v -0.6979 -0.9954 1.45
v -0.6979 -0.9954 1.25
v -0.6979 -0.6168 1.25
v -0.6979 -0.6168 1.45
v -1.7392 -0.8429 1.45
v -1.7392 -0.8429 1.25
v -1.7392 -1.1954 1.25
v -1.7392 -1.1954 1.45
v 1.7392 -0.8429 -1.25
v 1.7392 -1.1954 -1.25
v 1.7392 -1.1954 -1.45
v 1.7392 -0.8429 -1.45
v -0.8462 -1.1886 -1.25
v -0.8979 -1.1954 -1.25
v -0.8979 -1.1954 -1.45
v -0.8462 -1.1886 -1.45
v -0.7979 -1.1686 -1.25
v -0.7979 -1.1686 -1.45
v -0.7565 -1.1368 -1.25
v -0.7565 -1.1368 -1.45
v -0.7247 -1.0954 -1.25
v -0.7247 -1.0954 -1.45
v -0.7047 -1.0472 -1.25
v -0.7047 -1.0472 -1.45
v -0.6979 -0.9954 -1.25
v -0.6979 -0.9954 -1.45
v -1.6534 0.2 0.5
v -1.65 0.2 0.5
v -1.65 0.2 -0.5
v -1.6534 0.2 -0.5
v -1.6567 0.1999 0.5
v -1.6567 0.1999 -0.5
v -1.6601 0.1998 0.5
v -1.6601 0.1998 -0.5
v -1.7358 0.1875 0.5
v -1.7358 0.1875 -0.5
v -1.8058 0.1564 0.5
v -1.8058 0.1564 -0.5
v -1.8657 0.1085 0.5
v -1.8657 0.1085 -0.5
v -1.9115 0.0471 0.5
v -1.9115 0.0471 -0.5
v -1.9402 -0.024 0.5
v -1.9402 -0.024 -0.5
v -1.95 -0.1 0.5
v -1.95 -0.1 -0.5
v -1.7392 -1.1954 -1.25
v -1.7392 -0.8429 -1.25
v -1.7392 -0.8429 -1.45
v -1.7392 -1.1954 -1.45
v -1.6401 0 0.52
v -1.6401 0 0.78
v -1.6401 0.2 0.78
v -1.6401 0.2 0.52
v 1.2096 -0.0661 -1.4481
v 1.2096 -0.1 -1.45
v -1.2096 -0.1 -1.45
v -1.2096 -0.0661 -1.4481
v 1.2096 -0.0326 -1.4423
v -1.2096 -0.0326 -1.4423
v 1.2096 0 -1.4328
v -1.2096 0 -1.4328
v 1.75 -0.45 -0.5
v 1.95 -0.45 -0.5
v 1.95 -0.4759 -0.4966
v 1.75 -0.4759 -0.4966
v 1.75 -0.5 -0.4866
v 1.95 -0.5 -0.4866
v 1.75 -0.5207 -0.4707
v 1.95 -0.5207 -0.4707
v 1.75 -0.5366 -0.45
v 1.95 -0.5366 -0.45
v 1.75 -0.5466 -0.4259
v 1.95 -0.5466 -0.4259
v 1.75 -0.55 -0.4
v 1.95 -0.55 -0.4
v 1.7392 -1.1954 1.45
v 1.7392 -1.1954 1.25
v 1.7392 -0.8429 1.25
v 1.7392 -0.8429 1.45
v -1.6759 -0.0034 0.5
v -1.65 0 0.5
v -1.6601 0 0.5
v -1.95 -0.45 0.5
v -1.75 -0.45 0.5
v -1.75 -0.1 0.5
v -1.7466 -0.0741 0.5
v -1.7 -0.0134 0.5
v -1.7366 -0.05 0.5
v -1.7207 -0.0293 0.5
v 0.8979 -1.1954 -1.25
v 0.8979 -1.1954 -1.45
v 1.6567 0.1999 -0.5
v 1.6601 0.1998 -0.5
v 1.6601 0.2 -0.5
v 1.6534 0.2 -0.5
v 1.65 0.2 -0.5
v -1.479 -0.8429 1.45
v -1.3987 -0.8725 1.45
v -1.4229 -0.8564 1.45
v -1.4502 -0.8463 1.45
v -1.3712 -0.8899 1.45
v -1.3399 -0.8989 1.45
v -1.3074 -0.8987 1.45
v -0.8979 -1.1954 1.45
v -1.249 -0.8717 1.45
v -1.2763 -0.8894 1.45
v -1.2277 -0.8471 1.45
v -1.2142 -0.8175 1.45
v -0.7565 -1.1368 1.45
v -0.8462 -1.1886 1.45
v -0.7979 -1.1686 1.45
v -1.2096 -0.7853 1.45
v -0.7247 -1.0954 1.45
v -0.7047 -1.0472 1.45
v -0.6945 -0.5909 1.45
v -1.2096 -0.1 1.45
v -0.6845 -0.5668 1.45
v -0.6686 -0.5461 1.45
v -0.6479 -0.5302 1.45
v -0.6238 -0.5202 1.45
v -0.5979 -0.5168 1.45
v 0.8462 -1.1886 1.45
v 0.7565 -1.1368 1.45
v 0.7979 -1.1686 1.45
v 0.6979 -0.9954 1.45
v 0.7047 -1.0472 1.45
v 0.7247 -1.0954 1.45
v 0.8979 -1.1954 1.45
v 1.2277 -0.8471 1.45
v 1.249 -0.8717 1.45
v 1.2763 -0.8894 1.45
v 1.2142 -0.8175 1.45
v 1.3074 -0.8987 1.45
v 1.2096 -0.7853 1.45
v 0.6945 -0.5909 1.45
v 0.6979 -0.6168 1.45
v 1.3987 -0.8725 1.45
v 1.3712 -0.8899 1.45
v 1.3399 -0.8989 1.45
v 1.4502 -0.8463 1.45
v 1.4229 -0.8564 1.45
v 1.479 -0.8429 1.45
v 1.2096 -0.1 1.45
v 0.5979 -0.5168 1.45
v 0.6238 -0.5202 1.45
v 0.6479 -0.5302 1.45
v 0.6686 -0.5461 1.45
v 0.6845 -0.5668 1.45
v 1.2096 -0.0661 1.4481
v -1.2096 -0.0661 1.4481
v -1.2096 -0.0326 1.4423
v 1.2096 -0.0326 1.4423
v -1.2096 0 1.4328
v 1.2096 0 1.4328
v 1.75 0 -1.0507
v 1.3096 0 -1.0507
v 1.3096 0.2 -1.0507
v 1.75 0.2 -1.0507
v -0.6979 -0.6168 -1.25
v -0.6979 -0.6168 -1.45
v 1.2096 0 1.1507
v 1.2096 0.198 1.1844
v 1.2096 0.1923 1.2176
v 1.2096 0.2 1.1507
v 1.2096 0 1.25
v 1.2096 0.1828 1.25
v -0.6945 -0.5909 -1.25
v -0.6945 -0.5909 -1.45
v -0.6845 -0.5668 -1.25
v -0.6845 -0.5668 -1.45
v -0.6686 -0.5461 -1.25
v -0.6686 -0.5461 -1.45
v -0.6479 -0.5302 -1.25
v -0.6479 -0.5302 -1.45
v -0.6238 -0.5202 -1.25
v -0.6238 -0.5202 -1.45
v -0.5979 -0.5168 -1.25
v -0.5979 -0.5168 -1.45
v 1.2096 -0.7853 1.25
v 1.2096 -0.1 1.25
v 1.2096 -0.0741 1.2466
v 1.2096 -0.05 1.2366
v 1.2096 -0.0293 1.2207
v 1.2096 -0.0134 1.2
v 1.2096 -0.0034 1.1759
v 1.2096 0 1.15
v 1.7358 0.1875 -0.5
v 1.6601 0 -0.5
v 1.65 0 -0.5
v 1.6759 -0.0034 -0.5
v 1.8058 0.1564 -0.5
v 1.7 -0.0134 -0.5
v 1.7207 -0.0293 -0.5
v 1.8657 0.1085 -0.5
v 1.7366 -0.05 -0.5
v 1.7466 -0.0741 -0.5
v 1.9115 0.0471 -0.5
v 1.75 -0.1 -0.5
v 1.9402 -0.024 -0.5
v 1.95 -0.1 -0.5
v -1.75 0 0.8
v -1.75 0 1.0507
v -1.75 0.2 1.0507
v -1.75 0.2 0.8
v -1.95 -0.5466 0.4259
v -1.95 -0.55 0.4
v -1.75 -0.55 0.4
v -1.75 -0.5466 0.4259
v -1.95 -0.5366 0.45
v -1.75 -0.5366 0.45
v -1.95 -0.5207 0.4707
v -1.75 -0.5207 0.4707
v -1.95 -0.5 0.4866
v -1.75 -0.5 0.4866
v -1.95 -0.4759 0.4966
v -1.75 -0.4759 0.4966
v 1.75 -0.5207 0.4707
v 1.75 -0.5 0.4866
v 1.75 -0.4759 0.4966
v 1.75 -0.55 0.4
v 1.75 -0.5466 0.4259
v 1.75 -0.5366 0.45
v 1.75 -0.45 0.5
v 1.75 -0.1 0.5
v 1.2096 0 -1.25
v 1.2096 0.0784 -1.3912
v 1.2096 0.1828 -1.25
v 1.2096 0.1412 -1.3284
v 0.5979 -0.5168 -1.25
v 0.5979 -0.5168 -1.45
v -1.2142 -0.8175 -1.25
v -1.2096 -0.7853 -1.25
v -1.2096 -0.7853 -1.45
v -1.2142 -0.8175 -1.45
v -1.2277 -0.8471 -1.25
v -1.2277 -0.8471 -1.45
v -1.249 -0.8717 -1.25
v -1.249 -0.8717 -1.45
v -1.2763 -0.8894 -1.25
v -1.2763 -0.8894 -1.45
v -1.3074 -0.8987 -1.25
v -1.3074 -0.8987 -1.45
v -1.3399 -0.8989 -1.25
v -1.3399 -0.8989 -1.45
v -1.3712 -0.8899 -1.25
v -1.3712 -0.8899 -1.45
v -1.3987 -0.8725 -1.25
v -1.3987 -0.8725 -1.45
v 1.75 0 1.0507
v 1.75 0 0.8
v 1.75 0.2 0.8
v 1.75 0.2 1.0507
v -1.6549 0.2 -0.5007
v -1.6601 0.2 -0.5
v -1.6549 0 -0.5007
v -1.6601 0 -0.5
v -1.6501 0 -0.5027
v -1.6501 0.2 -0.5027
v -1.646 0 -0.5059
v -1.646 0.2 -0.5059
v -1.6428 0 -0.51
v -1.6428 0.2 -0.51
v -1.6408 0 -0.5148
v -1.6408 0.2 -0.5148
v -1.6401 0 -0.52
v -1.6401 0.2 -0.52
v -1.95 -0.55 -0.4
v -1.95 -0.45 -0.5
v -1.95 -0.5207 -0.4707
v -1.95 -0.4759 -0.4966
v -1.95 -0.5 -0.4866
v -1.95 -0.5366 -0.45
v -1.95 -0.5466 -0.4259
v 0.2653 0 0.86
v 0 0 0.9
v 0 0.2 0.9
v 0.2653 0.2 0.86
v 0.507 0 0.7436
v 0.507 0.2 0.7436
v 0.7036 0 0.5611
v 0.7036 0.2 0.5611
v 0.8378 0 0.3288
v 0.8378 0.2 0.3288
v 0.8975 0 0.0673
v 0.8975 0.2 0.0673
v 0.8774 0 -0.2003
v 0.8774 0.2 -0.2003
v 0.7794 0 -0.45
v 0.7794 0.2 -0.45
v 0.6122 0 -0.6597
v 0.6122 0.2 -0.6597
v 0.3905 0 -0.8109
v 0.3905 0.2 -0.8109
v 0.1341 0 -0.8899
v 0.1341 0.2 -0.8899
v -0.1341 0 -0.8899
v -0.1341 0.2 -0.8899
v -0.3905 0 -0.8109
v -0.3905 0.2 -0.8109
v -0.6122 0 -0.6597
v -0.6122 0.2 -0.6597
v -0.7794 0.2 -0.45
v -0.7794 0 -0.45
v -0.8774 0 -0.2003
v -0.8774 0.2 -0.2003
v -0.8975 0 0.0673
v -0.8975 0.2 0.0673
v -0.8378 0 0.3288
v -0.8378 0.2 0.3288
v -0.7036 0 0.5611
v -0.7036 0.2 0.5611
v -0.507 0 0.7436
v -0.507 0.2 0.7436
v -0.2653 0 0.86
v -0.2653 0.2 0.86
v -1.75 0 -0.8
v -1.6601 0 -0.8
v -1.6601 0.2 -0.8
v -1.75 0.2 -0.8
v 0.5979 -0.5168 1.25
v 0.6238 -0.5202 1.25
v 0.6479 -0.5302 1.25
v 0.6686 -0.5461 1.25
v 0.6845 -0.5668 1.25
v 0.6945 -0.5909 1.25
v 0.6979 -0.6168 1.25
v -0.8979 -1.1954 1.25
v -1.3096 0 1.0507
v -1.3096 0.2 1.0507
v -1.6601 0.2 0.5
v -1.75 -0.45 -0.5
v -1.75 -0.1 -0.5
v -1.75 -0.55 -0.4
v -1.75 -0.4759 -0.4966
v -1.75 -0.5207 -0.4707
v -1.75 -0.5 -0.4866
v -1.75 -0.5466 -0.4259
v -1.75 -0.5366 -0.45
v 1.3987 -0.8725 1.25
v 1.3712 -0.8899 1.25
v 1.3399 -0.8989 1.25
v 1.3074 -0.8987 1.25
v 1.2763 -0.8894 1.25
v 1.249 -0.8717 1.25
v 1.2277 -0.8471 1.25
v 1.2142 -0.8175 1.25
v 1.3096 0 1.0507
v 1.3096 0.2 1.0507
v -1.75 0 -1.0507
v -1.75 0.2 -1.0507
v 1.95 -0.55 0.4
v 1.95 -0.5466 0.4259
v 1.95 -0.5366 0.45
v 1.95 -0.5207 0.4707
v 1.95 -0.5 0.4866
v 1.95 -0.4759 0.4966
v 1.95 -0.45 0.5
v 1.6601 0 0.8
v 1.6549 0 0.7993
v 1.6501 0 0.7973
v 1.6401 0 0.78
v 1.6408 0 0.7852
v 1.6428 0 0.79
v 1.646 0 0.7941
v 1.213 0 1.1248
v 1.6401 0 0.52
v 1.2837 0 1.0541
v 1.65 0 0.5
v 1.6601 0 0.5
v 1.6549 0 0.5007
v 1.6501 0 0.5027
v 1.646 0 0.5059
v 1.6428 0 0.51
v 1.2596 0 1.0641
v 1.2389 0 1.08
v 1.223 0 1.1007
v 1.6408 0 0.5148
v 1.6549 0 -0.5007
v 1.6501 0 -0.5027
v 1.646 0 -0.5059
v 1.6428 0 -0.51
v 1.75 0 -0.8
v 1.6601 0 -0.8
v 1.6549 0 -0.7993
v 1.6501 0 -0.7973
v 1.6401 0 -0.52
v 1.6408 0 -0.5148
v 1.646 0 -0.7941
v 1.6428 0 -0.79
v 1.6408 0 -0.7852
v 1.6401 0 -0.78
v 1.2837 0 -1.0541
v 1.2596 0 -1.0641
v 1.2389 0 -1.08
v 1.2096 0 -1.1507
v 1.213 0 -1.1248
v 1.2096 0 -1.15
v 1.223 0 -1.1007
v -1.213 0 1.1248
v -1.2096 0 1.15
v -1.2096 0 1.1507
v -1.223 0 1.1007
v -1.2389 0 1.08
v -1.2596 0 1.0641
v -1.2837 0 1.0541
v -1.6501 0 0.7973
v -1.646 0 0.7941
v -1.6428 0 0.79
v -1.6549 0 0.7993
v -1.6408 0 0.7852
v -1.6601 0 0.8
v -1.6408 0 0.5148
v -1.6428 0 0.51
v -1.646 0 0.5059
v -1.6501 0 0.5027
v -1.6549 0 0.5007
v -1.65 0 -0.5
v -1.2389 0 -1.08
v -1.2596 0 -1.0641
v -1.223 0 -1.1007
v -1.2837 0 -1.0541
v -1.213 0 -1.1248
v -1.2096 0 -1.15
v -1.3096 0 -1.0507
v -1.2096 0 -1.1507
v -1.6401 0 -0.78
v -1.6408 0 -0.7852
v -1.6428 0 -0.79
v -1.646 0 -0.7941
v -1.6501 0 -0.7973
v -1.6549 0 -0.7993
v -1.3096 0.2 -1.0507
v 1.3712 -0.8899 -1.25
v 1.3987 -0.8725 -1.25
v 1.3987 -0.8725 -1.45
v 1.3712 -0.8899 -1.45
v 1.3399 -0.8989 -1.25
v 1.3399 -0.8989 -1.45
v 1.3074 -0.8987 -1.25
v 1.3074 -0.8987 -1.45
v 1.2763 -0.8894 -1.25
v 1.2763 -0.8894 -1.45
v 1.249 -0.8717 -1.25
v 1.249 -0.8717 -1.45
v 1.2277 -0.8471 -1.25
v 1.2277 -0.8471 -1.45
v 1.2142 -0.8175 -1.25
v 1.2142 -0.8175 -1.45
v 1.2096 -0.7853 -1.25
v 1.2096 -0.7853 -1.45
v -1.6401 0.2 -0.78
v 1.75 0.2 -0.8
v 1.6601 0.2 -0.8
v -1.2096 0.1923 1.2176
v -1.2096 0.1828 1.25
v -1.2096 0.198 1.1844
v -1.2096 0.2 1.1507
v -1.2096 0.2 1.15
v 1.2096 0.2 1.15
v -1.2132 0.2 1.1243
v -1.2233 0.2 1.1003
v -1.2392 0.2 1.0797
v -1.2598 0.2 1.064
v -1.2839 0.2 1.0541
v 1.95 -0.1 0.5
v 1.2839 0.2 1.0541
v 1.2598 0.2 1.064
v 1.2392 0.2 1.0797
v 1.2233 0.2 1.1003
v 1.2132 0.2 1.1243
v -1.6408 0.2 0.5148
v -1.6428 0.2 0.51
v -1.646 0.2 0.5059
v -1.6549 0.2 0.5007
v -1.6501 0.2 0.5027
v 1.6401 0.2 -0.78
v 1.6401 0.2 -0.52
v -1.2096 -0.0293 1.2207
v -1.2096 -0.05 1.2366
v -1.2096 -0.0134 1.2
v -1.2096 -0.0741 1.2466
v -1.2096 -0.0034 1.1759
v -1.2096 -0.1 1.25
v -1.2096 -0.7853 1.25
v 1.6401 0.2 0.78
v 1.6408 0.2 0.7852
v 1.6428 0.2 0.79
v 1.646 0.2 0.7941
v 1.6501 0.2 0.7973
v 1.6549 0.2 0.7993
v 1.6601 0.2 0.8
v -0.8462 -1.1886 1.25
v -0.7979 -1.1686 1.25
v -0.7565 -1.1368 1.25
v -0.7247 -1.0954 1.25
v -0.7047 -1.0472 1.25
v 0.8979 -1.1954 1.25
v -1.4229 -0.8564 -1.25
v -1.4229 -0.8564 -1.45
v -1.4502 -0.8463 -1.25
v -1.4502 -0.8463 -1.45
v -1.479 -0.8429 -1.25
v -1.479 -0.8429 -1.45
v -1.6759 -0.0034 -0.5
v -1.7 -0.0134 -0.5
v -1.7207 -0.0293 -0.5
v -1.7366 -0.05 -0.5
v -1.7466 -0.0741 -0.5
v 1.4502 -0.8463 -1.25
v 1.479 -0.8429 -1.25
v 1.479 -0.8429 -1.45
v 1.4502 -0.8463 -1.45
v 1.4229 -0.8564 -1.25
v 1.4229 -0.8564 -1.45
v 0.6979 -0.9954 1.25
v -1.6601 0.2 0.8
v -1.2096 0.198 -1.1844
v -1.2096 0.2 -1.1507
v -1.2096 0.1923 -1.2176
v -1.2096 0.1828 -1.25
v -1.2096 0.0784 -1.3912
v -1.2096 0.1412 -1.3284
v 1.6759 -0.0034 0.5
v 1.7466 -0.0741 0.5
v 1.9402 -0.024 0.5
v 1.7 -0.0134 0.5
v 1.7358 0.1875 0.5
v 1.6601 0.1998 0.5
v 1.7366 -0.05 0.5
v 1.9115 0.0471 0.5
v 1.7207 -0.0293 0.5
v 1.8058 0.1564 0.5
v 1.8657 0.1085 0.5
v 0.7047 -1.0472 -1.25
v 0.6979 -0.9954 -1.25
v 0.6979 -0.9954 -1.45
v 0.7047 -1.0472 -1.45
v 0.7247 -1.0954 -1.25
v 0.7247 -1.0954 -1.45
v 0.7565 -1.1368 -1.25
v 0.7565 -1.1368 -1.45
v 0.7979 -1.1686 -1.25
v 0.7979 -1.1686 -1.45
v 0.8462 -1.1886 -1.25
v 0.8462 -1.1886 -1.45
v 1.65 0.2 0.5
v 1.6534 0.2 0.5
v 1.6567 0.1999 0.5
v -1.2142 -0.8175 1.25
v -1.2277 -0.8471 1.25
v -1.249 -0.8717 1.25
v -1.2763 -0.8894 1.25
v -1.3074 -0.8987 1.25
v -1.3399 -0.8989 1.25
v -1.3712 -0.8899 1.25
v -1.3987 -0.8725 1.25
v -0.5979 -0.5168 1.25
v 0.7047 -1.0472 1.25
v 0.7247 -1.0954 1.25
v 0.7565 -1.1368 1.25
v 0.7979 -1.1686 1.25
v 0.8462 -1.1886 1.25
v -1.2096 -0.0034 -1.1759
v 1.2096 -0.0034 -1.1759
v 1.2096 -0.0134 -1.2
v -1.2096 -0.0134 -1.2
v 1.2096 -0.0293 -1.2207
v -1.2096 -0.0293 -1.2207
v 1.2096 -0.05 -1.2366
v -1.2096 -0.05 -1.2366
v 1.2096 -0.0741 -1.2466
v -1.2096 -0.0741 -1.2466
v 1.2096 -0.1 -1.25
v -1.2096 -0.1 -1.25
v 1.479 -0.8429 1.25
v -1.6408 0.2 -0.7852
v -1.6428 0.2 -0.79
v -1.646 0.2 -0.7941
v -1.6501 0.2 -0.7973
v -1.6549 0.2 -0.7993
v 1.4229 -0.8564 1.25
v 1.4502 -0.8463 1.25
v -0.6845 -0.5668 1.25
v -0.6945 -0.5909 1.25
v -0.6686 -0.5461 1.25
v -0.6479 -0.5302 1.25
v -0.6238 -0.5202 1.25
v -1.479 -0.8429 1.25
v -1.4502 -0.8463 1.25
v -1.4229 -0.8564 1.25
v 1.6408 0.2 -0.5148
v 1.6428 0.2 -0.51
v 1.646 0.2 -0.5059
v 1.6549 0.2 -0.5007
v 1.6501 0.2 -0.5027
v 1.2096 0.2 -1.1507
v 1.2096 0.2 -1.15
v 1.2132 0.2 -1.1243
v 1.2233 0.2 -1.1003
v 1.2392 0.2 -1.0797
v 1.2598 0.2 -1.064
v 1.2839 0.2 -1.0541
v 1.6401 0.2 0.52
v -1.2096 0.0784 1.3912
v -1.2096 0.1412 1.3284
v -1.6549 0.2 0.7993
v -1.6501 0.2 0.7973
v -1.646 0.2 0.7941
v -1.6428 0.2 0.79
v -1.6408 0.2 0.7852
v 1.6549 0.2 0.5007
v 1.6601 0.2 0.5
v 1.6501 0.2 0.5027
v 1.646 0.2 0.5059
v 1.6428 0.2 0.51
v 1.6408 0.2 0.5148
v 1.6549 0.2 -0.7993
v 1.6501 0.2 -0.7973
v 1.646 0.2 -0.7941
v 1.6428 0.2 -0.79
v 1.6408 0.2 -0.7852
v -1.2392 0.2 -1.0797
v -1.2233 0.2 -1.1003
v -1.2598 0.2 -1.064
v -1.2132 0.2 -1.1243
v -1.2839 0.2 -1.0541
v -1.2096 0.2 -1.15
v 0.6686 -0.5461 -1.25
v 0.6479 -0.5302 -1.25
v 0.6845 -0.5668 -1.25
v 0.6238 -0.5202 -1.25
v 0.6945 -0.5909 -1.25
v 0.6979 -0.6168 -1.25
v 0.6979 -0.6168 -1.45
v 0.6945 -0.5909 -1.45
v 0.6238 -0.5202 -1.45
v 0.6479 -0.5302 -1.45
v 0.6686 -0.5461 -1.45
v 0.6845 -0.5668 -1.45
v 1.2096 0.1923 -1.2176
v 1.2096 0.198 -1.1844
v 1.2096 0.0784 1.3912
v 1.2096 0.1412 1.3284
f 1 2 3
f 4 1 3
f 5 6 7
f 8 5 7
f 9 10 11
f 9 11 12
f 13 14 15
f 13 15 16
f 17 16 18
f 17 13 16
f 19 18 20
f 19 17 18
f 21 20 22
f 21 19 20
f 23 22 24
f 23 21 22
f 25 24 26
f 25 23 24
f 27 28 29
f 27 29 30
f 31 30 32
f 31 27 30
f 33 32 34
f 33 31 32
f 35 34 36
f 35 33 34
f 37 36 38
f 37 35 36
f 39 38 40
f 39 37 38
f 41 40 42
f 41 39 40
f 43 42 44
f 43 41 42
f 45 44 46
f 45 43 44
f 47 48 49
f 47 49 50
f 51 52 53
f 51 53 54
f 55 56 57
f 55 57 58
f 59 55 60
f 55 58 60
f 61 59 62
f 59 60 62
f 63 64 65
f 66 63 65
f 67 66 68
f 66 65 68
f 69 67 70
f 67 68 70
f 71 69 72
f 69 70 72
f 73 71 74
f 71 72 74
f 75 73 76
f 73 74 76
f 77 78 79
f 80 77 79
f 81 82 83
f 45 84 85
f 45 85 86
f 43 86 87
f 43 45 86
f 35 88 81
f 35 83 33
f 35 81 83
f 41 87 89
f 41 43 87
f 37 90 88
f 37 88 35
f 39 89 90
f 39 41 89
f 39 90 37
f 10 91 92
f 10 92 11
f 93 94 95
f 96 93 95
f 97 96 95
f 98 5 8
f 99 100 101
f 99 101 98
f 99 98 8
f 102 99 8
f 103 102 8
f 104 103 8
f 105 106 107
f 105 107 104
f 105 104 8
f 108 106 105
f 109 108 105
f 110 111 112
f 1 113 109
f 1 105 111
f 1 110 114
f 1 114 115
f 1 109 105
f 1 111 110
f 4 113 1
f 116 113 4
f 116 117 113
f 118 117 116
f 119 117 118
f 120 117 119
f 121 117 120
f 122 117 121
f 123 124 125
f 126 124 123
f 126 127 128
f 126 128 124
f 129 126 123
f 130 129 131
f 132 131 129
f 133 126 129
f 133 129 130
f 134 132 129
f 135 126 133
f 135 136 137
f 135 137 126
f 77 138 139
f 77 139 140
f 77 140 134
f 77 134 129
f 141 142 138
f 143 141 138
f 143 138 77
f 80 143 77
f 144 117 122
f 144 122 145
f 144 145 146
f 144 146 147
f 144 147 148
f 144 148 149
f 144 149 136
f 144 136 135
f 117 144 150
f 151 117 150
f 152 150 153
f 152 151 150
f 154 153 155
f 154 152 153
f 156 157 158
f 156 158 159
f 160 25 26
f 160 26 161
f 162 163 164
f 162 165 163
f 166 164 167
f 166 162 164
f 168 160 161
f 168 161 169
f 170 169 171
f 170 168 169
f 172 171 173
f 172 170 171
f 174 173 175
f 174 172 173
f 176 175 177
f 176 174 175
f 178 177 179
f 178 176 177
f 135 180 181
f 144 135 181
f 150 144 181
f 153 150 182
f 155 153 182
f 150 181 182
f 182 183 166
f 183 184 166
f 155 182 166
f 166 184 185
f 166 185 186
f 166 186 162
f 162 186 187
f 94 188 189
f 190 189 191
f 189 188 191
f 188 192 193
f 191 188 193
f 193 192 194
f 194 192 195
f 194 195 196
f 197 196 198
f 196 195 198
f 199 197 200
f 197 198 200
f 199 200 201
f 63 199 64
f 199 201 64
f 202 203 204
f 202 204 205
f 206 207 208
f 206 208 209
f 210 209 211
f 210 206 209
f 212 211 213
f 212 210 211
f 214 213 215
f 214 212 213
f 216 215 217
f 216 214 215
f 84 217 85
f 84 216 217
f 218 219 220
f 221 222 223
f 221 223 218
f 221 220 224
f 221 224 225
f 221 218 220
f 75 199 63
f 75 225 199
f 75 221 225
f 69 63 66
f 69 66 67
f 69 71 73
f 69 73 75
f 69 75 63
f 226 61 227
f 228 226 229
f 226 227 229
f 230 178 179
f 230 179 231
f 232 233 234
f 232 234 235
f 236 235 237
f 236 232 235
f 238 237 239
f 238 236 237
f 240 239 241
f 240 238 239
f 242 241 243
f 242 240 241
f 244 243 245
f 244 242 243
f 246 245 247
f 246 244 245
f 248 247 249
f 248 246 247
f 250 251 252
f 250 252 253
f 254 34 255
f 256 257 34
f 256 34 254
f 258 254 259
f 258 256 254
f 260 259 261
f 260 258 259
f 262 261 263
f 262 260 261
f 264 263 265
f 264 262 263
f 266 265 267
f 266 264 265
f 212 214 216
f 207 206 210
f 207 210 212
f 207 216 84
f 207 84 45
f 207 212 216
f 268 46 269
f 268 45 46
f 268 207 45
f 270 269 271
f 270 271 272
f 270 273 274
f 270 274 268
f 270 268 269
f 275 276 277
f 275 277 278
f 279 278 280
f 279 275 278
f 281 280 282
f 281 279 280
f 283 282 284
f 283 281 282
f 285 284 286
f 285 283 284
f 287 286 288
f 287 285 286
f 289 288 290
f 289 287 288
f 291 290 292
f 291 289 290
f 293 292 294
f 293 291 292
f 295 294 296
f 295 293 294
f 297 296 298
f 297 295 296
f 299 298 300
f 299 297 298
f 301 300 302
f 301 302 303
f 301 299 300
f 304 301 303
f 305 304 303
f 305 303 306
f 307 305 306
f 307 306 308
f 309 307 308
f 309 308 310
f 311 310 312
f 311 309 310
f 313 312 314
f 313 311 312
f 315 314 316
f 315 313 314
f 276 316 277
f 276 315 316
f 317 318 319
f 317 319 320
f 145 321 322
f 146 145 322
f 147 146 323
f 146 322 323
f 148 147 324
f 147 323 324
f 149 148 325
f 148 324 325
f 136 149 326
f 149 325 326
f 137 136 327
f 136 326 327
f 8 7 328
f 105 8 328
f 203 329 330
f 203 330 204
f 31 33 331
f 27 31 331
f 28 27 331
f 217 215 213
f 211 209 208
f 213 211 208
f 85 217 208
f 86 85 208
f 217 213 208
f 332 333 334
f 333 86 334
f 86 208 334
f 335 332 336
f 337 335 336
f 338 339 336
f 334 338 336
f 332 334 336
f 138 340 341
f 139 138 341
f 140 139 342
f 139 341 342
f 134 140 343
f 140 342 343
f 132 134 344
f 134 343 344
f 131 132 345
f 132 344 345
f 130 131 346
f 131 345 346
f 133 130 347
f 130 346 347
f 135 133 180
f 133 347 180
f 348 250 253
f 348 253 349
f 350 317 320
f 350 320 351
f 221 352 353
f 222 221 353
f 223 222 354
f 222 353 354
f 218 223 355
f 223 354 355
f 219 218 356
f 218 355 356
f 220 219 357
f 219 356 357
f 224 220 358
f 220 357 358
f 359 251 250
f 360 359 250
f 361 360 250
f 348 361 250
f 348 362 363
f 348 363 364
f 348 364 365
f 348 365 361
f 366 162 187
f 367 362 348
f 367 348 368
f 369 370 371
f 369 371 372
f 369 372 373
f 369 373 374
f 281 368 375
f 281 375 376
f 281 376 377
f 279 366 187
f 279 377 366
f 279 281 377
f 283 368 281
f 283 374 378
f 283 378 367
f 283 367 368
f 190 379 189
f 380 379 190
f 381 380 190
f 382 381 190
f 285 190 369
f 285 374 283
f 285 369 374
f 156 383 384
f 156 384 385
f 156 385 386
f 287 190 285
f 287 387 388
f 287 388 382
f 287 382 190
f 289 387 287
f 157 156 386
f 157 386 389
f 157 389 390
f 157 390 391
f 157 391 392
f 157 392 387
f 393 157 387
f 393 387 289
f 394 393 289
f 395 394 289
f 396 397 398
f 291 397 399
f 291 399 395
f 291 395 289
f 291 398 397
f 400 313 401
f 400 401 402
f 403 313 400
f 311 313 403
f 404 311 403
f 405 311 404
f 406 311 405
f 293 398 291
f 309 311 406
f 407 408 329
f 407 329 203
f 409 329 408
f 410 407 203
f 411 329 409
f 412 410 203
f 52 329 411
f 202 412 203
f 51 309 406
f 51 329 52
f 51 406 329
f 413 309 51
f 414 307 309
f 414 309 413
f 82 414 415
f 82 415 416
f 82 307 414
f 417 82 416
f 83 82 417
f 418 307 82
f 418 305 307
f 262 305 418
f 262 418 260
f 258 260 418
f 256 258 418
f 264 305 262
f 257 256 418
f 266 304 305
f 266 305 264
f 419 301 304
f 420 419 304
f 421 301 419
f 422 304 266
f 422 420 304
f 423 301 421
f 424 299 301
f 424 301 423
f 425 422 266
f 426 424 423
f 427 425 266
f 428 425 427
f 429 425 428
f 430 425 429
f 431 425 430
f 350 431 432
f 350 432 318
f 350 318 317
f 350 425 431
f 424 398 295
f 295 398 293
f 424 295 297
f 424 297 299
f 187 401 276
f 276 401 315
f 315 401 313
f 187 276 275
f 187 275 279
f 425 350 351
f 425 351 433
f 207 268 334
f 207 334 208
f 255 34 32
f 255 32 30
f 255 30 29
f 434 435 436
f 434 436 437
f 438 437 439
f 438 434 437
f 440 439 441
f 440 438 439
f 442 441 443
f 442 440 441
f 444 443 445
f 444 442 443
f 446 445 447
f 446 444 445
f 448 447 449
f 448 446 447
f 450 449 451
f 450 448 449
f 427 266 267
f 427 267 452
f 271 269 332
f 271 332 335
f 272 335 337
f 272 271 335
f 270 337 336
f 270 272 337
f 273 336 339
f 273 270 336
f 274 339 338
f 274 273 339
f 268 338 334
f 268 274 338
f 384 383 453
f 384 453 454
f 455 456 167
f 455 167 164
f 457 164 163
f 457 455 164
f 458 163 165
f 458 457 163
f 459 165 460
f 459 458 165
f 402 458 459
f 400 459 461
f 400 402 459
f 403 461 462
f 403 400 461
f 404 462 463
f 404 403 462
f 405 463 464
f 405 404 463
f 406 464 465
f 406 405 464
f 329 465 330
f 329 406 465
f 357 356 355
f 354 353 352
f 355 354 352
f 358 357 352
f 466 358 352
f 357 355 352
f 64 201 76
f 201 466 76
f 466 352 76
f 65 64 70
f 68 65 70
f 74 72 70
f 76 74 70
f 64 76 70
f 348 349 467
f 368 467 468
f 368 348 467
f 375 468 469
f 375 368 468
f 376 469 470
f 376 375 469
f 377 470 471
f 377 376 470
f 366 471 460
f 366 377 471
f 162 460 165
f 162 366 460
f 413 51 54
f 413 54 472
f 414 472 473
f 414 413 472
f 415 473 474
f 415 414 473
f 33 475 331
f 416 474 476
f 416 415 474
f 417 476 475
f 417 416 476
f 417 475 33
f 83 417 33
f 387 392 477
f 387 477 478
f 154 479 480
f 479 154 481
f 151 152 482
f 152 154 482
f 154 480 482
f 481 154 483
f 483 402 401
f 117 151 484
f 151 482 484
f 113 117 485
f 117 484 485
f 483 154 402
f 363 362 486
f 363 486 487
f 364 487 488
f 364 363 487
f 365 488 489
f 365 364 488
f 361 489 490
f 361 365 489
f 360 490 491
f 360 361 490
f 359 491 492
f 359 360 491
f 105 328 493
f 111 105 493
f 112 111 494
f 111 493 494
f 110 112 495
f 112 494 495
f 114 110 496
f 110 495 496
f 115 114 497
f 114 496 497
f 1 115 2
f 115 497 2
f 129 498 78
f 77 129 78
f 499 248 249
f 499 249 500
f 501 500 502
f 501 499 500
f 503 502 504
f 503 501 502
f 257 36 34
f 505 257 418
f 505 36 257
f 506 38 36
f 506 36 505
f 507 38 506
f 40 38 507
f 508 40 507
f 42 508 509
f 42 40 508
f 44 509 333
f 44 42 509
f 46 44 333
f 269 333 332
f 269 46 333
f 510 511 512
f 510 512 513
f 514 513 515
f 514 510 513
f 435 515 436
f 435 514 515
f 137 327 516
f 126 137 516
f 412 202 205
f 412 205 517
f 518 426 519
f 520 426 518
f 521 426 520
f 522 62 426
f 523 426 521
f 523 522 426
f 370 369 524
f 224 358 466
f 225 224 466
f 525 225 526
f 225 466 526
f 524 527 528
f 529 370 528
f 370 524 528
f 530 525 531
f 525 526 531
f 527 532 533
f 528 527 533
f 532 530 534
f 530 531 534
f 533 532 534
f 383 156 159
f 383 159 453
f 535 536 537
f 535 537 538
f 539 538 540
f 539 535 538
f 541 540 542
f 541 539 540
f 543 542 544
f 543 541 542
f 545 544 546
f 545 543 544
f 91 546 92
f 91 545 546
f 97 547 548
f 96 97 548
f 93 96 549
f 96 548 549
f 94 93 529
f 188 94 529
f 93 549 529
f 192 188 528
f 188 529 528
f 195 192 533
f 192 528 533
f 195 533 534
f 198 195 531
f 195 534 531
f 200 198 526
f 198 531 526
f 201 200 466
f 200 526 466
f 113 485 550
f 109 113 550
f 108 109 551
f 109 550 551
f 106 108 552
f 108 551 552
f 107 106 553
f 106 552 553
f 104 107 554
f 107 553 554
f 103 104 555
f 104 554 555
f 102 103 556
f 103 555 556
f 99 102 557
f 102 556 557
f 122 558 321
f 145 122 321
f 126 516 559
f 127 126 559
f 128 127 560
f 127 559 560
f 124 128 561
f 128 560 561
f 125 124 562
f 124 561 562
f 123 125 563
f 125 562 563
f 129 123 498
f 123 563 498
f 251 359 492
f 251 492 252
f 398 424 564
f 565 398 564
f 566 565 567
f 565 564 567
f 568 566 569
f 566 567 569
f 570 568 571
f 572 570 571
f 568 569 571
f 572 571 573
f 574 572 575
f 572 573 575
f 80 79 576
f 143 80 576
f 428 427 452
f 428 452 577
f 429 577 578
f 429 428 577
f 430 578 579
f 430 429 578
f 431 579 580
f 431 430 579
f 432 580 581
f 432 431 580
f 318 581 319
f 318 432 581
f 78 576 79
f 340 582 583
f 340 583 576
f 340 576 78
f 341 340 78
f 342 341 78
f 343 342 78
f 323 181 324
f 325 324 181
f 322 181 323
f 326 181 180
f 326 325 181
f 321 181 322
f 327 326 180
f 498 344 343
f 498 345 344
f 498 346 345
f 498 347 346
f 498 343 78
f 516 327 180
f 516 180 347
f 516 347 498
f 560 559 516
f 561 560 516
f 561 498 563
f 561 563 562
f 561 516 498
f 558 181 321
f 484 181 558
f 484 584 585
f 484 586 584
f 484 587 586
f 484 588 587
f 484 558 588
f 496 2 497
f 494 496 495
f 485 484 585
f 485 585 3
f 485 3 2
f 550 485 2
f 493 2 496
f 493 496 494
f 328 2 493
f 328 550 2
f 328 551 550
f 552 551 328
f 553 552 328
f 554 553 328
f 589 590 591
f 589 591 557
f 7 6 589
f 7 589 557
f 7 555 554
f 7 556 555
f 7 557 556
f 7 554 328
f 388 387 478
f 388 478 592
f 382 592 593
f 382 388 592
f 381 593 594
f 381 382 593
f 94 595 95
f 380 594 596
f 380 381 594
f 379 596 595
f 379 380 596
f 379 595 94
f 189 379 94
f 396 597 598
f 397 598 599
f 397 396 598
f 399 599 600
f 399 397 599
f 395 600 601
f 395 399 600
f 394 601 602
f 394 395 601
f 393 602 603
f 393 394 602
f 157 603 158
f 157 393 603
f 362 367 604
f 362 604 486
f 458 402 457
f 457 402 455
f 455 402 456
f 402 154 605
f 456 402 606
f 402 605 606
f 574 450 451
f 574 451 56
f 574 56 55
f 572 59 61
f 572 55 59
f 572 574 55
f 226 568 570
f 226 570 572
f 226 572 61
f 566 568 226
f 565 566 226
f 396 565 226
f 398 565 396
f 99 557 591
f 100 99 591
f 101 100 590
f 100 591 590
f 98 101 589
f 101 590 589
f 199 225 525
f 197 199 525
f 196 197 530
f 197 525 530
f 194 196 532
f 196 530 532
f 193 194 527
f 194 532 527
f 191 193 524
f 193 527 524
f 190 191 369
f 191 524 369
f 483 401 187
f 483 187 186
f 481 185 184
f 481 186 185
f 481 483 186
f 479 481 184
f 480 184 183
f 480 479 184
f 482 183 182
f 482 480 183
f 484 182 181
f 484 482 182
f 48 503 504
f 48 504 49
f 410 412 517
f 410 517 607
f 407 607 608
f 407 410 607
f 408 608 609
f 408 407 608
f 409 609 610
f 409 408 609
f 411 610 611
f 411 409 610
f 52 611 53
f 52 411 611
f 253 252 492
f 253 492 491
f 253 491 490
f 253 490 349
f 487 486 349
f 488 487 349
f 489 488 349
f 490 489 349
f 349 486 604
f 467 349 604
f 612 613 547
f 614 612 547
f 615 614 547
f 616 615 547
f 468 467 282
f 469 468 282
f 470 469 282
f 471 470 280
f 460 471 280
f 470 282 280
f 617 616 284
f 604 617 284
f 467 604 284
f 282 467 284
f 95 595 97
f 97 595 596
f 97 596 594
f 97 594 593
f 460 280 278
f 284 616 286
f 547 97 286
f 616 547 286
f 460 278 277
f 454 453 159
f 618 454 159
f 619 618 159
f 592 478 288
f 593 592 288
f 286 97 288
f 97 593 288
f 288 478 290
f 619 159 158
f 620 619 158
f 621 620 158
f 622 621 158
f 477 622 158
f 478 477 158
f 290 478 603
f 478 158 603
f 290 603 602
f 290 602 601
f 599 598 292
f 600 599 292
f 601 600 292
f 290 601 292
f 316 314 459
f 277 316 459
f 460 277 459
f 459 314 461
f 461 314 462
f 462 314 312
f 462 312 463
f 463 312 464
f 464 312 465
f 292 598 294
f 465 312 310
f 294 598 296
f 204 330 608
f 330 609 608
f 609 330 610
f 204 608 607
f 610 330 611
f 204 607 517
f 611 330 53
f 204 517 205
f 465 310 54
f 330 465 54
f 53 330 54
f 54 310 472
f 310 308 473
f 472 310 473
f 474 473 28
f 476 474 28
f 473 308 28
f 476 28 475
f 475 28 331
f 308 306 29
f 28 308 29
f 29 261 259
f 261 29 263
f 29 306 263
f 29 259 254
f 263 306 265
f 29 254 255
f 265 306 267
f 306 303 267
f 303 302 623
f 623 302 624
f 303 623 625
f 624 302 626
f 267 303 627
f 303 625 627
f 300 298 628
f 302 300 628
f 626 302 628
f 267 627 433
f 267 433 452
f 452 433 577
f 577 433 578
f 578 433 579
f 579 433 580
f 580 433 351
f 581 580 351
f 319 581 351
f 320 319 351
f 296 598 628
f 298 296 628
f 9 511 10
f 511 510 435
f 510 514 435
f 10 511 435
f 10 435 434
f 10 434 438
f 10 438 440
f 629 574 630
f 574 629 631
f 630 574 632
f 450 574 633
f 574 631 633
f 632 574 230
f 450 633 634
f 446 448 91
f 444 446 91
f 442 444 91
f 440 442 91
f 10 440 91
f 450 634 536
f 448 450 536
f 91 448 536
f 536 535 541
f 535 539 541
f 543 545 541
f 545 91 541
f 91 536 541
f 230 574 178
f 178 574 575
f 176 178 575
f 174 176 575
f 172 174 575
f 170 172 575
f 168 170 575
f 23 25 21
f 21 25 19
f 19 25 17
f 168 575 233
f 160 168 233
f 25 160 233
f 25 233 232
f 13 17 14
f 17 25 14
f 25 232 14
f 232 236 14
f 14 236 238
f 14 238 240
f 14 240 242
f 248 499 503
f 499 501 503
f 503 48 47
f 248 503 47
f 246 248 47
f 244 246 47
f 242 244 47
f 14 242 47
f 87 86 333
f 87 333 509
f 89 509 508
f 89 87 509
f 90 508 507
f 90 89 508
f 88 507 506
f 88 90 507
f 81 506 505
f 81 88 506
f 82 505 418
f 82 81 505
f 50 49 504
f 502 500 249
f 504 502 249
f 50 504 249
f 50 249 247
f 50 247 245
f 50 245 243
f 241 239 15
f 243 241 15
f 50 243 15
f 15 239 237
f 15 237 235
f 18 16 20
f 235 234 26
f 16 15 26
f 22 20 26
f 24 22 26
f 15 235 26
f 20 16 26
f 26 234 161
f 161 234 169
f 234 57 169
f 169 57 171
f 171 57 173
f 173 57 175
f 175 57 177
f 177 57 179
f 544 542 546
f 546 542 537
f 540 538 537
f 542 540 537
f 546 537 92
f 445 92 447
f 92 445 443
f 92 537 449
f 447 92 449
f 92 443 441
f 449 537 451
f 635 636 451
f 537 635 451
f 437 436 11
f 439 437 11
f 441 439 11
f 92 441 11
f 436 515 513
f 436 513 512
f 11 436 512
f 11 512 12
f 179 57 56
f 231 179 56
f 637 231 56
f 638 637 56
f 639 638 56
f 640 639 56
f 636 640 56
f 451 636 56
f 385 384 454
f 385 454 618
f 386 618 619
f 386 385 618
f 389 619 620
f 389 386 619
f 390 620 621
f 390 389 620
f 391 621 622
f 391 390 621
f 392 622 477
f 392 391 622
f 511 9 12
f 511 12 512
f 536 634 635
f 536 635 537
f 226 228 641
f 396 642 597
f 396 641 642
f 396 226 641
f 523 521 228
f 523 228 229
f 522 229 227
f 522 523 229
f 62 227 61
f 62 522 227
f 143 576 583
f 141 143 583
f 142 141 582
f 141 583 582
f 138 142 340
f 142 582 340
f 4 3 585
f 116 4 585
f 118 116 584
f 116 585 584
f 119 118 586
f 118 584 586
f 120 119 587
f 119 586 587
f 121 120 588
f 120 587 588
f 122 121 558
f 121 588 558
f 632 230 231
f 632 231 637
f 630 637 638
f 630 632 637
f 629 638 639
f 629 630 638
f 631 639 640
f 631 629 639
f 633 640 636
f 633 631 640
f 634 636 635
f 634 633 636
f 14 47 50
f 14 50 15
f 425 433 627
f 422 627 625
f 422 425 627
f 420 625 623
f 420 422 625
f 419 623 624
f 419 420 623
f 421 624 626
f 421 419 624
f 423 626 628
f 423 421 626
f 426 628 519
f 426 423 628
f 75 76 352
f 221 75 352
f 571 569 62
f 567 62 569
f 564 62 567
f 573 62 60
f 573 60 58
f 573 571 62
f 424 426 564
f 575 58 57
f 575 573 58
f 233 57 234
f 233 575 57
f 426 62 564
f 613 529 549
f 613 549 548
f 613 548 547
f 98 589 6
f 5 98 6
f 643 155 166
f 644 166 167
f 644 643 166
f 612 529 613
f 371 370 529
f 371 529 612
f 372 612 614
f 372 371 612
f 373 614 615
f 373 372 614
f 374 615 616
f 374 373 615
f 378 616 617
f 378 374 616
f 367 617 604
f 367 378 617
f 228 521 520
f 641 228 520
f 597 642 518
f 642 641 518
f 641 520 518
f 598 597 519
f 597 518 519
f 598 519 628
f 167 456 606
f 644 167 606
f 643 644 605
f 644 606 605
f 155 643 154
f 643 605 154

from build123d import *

# Parameters (mm, degrees)
SKETCH_3_R                       = 0.9
SM_BASE_FLANGE_1_DEPTH           = 0.2
SM_EDGE_FLANGE_3_DEPTH           = 0.169178
SM_START                         = 1.15
SM_EDGE_FLANGE_3_2_DEPTH         = 0.3
SM_START_2                       = -1.739216372
SM_EDGE_FLANGE_3_3_DEPTH         = 3.478432744
SM_START_3                       = -1.209627878
SM_EDGE_FLANGE_3_4_DEPTH         = 2.419255168
SM_EDGE_FLANGE_4_STRIP_W         = 1
SM_EDGE_FLANGE_4_STRIP_H         = 0.2
SM_EDGE_FLANGE_4_STRIP_CUT_DEPTH = 1
SM_EDGE_FLANGE_4_DEPTH           = 1
SM_START_4                       = 0.2
SM_EDGE_FLANGE_4_FLAT_DEPTH      = 0.2


with BuildPart() as part:
    # 基体-法兰1: sheet metal written as solids
    # 草图3 → 基体-法兰1 (new body)
    with BuildSketch(Plane(origin=(0, 0, 0), x_dir=(1, 0, 0), z_dir=(0, 1, 0))):
        with BuildLine():
            Line((1.75, 0.5), (1.75, -0.5))
            Line((1.75, -0.5), (1.690116035, -0.5))
            Line((1.690116035, -0.5), (1.660116035, -0.5))
            ThreePointArc((1.660116035, -0.5), (1.645973899, -0.505857864), (1.640116035, -0.52))
            Line((1.640116035, -0.52), (1.640116035, -0.55))
            Line((1.640116035, -0.55), (1.640116035, -0.75))
            Line((1.640116035, -0.75), (1.640116035, -0.78))
            ThreePointArc((1.640116035, -0.78), (1.645973899, -0.794142136), (1.660116035, -0.8))
            Line((1.660116035, -0.8), (1.690116035, -0.8))
            Line((1.690116035, -0.8), (1.75, -0.8))
            Line((1.75, -0.8), (1.75, -1.050703944))
            Line((1.75, -1.050703944), (1.309627878, -1.050703944))
            ThreePointArc((1.309627878, -1.050703944), (1.2389172, -1.079993266), (1.209627878, -1.150703944))
            Line((1.209627878, -1.150703944), (1.209627878, -1.244254067))
            Line((1.209627878, -1.244254067), (1.209627878, -1.25))
            Line((1.209627878, -1.25), (1.121614786, -1.25))
            Line((1.121614786, -1.25), (-1.121614786, -1.25))
            Line((-1.121614786, -1.25), (-1.209627878, -1.25))
            Line((-1.209627878, -1.25), (-1.209627878, -1.244254067))
            Line((-1.209627878, -1.244254067), (-1.209627878, -1.150703944))
            ThreePointArc((-1.209627878, -1.150703944), (-1.2389172, -1.079993266), (-1.309627878, -1.050703944))
            Line((-1.309627878, -1.050703944), (-1.75, -1.050703944))
            Line((-1.75, -1.050703944), (-1.75, -0.8))
            Line((-1.75, -0.8), (-1.690116035, -0.8))
            Line((-1.690116035, -0.8), (-1.660116035, -0.8))
            ThreePointArc((-1.660116035, -0.8), (-1.645973899, -0.794142136), (-1.640116035, -0.78))
            Line((-1.640116035, -0.78), (-1.640116035, -0.75))
            Line((-1.640116035, -0.75), (-1.640116035, -0.55))
            Line((-1.640116035, -0.55), (-1.640116035, -0.52))
            ThreePointArc((-1.640116035, -0.52), (-1.645973899, -0.505857864), (-1.660116035, -0.5))
            Line((-1.660116035, -0.5), (-1.690116035, -0.5))
            Line((-1.690116035, -0.5), (-1.75, -0.5))
            Line((-1.75, -0.5), (-1.75, 0.5))
            Line((-1.75, 0.5), (-1.690116035, 0.5))
            Line((-1.690116035, 0.5), (-1.660116035, 0.5))
            ThreePointArc((-1.660116035, 0.5), (-1.645973899, 0.505857864), (-1.640116035, 0.52))
            Line((-1.640116035, 0.52), (-1.640116035, 0.55))
            Line((-1.640116035, 0.55), (-1.640116035, 0.75))
            Line((-1.640116035, 0.75), (-1.640116035, 0.78))
            ThreePointArc((-1.640116035, 0.78), (-1.645973899, 0.794142136), (-1.660116035, 0.8))
            Line((-1.660116035, 0.8), (-1.690116035, 0.8))
            Line((-1.690116035, 0.8), (-1.75, 0.8))
            Line((-1.75, 0.8), (-1.75, 1.050703944))
            Line((-1.75, 1.050703944), (-1.309627878, 1.050703944))
            ThreePointArc((-1.309627878, 1.050703944), (-1.2389172, 1.079993266), (-1.209627878, 1.150703944))
            Line((-1.209627878, 1.150703944), (-1.209627878, 1.244254067))
            Line((-1.209627878, 1.244254067), (-1.209627878, 1.25))
            Line((-1.209627878, 1.25), (-1.121614786, 1.25))
            Line((-1.121614786, 1.25), (1.121614786, 1.25))
            Line((1.121614786, 1.25), (1.209627878, 1.25))
            Line((1.209627878, 1.25), (1.209627878, 1.244254067))
            Line((1.209627878, 1.244254067), (1.209627878, 1.150703944))
            ThreePointArc((1.209627878, 1.150703944), (1.2389172, 1.079993266), (1.309627878, 1.050703944))
            Line((1.309627878, 1.050703944), (1.75, 1.050703944))
            Line((1.75, 1.050703944), (1.75, 0.8))
            Line((1.75, 0.8), (1.690116035, 0.8))
            Line((1.690116035, 0.8), (1.660116035, 0.8))
            ThreePointArc((1.660116035, 0.8), (1.645973899, 0.794142136), (1.640116035, 0.78))
            Line((1.640116035, 0.78), (1.640116035, 0.75))
            Line((1.640116035, 0.75), (1.640116035, 0.55))
            Line((1.640116035, 0.55), (1.640116035, 0.52))
            ThreePointArc((1.640116035, 0.52), (1.645973899, 0.505857864), (1.660116035, 0.5))
            Line((1.660116035, 0.5), (1.690116035, 0.5))
            Line((1.690116035, 0.5), (1.75, 0.5))
        make_face()
        with Locations(Location((0, 0, 0), (0, 0, 270))):
            Circle(SKETCH_3_R, mode=Mode.SUBTRACT)
    extrude(amount=SM_BASE_FLANGE_1_DEPTH)

    # 边线-法兰3: read off the stored shape, not the designer's step
    # 边线-法兰3 outline → 边线-法兰3 (add)
    with BuildSketch(Plane(origin=(0, 0, 1.25), x_dir=(-1, 0, 0), z_dir=(0, 0, 1))):
        with BuildLine():
            Line((-1.20962729, 0.785296441), (-1.209627878, 0))
            Line((-1.209627878, 0), (1.209627878, 0))
            Line((1.209627878, 0), (1.20962729, 0.785296441))
            ThreePointArc((1.20962729, 0.785296441), (1.276253046, 0.889408078), (1.398699548, 0.872523806))
            ThreePointArc((1.398699548, 0.872523806), (1.436230193, 0.850547775), (1.479045273, 0.842908124))
            Line((1.479045273, 0.842908124), (1.739216372, 0.842908124))
            Line((1.739216372, 0.842908124), (1.739216372, 1.195393252))
            Line((1.739216372, 1.195393252), (0.897930032, 1.195393252))
            ThreePointArc((0.897930032, 1.195393252), (0.756508676, 1.136814608), (0.697930032, 0.995393252))
            Line((0.697930032, 0.995393252), (0.697930032, 0.616780813))
            ThreePointArc((0.697930032, 0.616780813), (0.66864071, 0.546070134), (0.597930032, 0.516780813))
            Line((0.597930032, 0.516780813), (-0.597930032, 0.516780813))
            ThreePointArc((-0.597930032, 0.516780813), (-0.66864071, 0.546070135), (-0.697930032, 0.616780813))
            Line((-0.697930032, 0.616780813), (-0.697930032, 0.995393252))
            ThreePointArc((-0.697930032, 0.995393252), (-0.756508676, 1.136814608), (-0.897930032, 1.195393252))
            Line((-0.897930032, 1.195393252), (-1.739216372, 1.195393252))
            Line((-1.739216372, 1.195393252), (-1.739216372, 0.842908124))
            Line((-1.739216372, 0.842908124), (-1.479045273, 0.842908124))
            ThreePointArc((-1.479045273, 0.842908124), (-1.436230193, 0.850547775), (-1.398699548, 0.872523806))
            ThreePointArc((-1.398699548, 0.872523806), (-1.276253046, 0.889408078), (-1.20962729, 0.785296441))
        make_face()
    sm_edge_flange_3 = extrude(amount=SM_EDGE_FLANGE_3_DEPTH)

    # Sm Edge Flange 3 2 outline → Sm Edge Flange 3 2 (add)
    with BuildSketch(Plane.XY.offset(SM_START)):
        with BuildLine():
            Line((1.20962729, -0.785296441), (1.209627878, 0))
            Line((1.209627878, 0), (-1.209627878, 0))
            Line((-1.209627878, 0), (-1.20962729, -0.785296441))
            ThreePointArc((-1.20962729, -0.785296441), (-1.276253046, -0.889408078), (-1.398699548, -0.872523806))
            ThreePointArc((-1.398699548, -0.872523806), (-1.436230193, -0.850547775), (-1.479045273, -0.842908124))
            Line((-1.479045273, -0.842908124), (-1.739216372, -0.842908124))
            Line((-1.739216372, -0.842908124), (-1.739216372, -1.195393252))
            Line((-1.739216372, -1.195393252), (-0.897930032, -1.195393252))
            ThreePointArc((-0.897930032, -1.195393252), (-0.756508676, -1.136814608), (-0.697930032, -0.995393252))
            Line((-0.697930032, -0.995393252), (-0.697930032, -0.616780813))
            ThreePointArc((-0.697930032, -0.616780813), (-0.66864071, -0.546070134), (-0.597930032, -0.516780813))
            Line((-0.597930032, -0.516780813), (0.597930032, -0.516780813))
            ThreePointArc((0.597930032, -0.516780813), (0.66864071, -0.546070135), (0.697930032, -0.616780813))
            Line((0.697930032, -0.616780813), (0.697930032, -0.995393252))
            ThreePointArc((0.697930032, -0.995393252), (0.756508676, -1.136814608), (0.897930032, -1.195393252))
            Line((0.897930032, -1.195393252), (1.739216372, -1.195393252))
            Line((1.739216372, -1.195393252), (1.739216372, -0.842908124))
            Line((1.739216372, -0.842908124), (1.479045273, -0.842908124))
            ThreePointArc((1.479045273, -0.842908124), (1.436230193, -0.850547775), (1.398699548, -0.872523806))
            ThreePointArc((1.398699548, -0.872523806), (1.276253046, -0.889408078), (1.20962729, -0.785296441))
        make_face()
    sm_edge_flange_3_2 = extrude(amount=SM_EDGE_FLANGE_3_2_DEPTH)

    # Sm Edge Flange 3 3 outline → Sm Edge Flange 3 3 (cut)
    with BuildSketch(Plane.YZ.offset(SM_START_2)):
        with BuildLine():
            Line((0, 1.45), (-0.1, 1.45))
            ThreePointArc((-0.1, 1.45), (-0.049269406, 1.445679568), (0, 1.432842712))
            Line((0, 1.432842712), (0, 1.45))
        make_face()
        with BuildLine():
            Line((0.2, 1.25), (0.182842712, 1.25))
            ThreePointArc((0.182842712, 1.25), (0.195679568, 1.200730594), (0.2, 1.15))
            Line((0.2, 1.15), (0.2, 1.25))
        make_face()
        with BuildLine():
            ThreePointArc((0, 1.15), (-0.029289322, 1.220710678), (-0.1, 1.25))
            Line((-0.1, 1.25), (-1.195393252, 1.25))
            Line((-1.195393252, 1.25), (-1.195393252, 1.15))
            Line((-1.195393252, 1.15), (0, 1.15))
        make_face()
    sm_edge_flange_3_3 = extrude(amount=SM_EDGE_FLANGE_3_3_DEPTH, mode=Mode.SUBTRACT)

    # Sm Edge Flange 3 4 outline → Sm Edge Flange 3 4 (add)
    with BuildSketch(Plane.YZ.offset(SM_START_3)):
        with BuildLine():
            ThreePointArc((0.182842712, 1.25), (0.112132034, 1.362132034), (0, 1.432842712))
            Line((0, 1.432842712), (0, 1.25))
            Line((0, 1.25), (0.182842712, 1.25))
        make_face()
    sm_edge_flange_3_4 = extrude(amount=SM_EDGE_FLANGE_3_4_DEPTH)

    # 镜向2: 边线-法兰3, Sm Edge Flange 3 2, Sm Edge Flange 3 3, Sm Edge Flange 3 4 across plane
    add(sm_edge_flange_3.mirror(Plane.XY))
    add(sm_edge_flange_3_2.mirror(Plane.XY))
    add(sm_edge_flange_3_3.mirror(Plane.XY), mode=Mode.SUBTRACT)
    add(sm_edge_flange_3_4.mirror(Plane.XY))

    # 边线-法兰4: sheet metal written as solids
    # 边线-法兰4 strip (on a plane across the edge) → 边线-法兰4 strip cut (cut)
    with BuildSketch(Plane(origin=(-1.75, 0, 0.5), x_dir=(1, 0, 0), z_dir=(0, 0, -1))):
        with Locations((-0.4, -0.1)):
            Rectangle(SM_EDGE_FLANGE_4_STRIP_W, SM_EDGE_FLANGE_4_STRIP_H)
    sm_edge_flange_4_strip_cut = extrude(amount=SM_EDGE_FLANGE_4_STRIP_CUT_DEPTH, mode=Mode.SUBTRACT)

    # 边线-法兰4 bend section (on a plane across the edge) → 边线-法兰4 (add)
    with BuildSketch(Plane(origin=(-1.75, 0, 0.5), x_dir=(1, 0, 0), z_dir=(0, 0, -1))):
        with BuildLine():
            Line((-0.2, 0.1), (0, 0.1))
            ThreePointArc((0, 0.1), (0.029289322, 0.029289322), (0.1, 0))
            Line((0.1, 0), (0.1, -0.2))
            ThreePointArc((0.1, -0.2), (-0.112132034, -0.112132034), (-0.2, 0.1))
        make_face()
    sm_edge_flange_4 = extrude(amount=SM_EDGE_FLANGE_4_DEPTH)

    # 边线-法兰4 profile (on flange) → 边线-法兰4 flat (add)
    with BuildSketch(Plane(origin=(-1.75, 0, 0), x_dir=(0, 0, -1), z_dir=(-1, 0, 0)).offset(SM_START_4)):
        with BuildLine():
            Line((0.5, 0.1), (0.5, 0.45))
            ThreePointArc((0.5, 0.45), (0.470710678, 0.520710678), (0.4, 0.55))
            Line((0.4, 0.55), (-0.4, 0.55))
            ThreePointArc((-0.4, 0.55), (-0.470710678, 0.520710678), (-0.5, 0.45))
            Line((-0.5, 0.45), (-0.5, 0.1))
            Line((-0.5, 0.1), (0.5, 0.1))
        make_face()
    sm_edge_flange_4_flat = extrude(amount=-SM_EDGE_FLANGE_4_FLAT_DEPTH)

    # 镜向3: 边线-法兰4 strip cut, 边线-法兰4, 边线-法兰4 flat across plane
    add(sm_edge_flange_4_strip_cut.mirror(Plane(origin=(0, 0, 0), x_dir=(0, 0, 1), z_dir=(1, 0, 0))), mode=Mode.SUBTRACT)
    add(sm_edge_flange_4.mirror(Plane(origin=(0, 0, 0), x_dir=(0, 0, 1), z_dir=(1, 0, 0))))
    add(sm_edge_flange_4_flat.mirror(Plane(origin=(0, 0, 0), x_dir=(0, 0, 1), z_dir=(1, 0, 0))))


solid = part.part
